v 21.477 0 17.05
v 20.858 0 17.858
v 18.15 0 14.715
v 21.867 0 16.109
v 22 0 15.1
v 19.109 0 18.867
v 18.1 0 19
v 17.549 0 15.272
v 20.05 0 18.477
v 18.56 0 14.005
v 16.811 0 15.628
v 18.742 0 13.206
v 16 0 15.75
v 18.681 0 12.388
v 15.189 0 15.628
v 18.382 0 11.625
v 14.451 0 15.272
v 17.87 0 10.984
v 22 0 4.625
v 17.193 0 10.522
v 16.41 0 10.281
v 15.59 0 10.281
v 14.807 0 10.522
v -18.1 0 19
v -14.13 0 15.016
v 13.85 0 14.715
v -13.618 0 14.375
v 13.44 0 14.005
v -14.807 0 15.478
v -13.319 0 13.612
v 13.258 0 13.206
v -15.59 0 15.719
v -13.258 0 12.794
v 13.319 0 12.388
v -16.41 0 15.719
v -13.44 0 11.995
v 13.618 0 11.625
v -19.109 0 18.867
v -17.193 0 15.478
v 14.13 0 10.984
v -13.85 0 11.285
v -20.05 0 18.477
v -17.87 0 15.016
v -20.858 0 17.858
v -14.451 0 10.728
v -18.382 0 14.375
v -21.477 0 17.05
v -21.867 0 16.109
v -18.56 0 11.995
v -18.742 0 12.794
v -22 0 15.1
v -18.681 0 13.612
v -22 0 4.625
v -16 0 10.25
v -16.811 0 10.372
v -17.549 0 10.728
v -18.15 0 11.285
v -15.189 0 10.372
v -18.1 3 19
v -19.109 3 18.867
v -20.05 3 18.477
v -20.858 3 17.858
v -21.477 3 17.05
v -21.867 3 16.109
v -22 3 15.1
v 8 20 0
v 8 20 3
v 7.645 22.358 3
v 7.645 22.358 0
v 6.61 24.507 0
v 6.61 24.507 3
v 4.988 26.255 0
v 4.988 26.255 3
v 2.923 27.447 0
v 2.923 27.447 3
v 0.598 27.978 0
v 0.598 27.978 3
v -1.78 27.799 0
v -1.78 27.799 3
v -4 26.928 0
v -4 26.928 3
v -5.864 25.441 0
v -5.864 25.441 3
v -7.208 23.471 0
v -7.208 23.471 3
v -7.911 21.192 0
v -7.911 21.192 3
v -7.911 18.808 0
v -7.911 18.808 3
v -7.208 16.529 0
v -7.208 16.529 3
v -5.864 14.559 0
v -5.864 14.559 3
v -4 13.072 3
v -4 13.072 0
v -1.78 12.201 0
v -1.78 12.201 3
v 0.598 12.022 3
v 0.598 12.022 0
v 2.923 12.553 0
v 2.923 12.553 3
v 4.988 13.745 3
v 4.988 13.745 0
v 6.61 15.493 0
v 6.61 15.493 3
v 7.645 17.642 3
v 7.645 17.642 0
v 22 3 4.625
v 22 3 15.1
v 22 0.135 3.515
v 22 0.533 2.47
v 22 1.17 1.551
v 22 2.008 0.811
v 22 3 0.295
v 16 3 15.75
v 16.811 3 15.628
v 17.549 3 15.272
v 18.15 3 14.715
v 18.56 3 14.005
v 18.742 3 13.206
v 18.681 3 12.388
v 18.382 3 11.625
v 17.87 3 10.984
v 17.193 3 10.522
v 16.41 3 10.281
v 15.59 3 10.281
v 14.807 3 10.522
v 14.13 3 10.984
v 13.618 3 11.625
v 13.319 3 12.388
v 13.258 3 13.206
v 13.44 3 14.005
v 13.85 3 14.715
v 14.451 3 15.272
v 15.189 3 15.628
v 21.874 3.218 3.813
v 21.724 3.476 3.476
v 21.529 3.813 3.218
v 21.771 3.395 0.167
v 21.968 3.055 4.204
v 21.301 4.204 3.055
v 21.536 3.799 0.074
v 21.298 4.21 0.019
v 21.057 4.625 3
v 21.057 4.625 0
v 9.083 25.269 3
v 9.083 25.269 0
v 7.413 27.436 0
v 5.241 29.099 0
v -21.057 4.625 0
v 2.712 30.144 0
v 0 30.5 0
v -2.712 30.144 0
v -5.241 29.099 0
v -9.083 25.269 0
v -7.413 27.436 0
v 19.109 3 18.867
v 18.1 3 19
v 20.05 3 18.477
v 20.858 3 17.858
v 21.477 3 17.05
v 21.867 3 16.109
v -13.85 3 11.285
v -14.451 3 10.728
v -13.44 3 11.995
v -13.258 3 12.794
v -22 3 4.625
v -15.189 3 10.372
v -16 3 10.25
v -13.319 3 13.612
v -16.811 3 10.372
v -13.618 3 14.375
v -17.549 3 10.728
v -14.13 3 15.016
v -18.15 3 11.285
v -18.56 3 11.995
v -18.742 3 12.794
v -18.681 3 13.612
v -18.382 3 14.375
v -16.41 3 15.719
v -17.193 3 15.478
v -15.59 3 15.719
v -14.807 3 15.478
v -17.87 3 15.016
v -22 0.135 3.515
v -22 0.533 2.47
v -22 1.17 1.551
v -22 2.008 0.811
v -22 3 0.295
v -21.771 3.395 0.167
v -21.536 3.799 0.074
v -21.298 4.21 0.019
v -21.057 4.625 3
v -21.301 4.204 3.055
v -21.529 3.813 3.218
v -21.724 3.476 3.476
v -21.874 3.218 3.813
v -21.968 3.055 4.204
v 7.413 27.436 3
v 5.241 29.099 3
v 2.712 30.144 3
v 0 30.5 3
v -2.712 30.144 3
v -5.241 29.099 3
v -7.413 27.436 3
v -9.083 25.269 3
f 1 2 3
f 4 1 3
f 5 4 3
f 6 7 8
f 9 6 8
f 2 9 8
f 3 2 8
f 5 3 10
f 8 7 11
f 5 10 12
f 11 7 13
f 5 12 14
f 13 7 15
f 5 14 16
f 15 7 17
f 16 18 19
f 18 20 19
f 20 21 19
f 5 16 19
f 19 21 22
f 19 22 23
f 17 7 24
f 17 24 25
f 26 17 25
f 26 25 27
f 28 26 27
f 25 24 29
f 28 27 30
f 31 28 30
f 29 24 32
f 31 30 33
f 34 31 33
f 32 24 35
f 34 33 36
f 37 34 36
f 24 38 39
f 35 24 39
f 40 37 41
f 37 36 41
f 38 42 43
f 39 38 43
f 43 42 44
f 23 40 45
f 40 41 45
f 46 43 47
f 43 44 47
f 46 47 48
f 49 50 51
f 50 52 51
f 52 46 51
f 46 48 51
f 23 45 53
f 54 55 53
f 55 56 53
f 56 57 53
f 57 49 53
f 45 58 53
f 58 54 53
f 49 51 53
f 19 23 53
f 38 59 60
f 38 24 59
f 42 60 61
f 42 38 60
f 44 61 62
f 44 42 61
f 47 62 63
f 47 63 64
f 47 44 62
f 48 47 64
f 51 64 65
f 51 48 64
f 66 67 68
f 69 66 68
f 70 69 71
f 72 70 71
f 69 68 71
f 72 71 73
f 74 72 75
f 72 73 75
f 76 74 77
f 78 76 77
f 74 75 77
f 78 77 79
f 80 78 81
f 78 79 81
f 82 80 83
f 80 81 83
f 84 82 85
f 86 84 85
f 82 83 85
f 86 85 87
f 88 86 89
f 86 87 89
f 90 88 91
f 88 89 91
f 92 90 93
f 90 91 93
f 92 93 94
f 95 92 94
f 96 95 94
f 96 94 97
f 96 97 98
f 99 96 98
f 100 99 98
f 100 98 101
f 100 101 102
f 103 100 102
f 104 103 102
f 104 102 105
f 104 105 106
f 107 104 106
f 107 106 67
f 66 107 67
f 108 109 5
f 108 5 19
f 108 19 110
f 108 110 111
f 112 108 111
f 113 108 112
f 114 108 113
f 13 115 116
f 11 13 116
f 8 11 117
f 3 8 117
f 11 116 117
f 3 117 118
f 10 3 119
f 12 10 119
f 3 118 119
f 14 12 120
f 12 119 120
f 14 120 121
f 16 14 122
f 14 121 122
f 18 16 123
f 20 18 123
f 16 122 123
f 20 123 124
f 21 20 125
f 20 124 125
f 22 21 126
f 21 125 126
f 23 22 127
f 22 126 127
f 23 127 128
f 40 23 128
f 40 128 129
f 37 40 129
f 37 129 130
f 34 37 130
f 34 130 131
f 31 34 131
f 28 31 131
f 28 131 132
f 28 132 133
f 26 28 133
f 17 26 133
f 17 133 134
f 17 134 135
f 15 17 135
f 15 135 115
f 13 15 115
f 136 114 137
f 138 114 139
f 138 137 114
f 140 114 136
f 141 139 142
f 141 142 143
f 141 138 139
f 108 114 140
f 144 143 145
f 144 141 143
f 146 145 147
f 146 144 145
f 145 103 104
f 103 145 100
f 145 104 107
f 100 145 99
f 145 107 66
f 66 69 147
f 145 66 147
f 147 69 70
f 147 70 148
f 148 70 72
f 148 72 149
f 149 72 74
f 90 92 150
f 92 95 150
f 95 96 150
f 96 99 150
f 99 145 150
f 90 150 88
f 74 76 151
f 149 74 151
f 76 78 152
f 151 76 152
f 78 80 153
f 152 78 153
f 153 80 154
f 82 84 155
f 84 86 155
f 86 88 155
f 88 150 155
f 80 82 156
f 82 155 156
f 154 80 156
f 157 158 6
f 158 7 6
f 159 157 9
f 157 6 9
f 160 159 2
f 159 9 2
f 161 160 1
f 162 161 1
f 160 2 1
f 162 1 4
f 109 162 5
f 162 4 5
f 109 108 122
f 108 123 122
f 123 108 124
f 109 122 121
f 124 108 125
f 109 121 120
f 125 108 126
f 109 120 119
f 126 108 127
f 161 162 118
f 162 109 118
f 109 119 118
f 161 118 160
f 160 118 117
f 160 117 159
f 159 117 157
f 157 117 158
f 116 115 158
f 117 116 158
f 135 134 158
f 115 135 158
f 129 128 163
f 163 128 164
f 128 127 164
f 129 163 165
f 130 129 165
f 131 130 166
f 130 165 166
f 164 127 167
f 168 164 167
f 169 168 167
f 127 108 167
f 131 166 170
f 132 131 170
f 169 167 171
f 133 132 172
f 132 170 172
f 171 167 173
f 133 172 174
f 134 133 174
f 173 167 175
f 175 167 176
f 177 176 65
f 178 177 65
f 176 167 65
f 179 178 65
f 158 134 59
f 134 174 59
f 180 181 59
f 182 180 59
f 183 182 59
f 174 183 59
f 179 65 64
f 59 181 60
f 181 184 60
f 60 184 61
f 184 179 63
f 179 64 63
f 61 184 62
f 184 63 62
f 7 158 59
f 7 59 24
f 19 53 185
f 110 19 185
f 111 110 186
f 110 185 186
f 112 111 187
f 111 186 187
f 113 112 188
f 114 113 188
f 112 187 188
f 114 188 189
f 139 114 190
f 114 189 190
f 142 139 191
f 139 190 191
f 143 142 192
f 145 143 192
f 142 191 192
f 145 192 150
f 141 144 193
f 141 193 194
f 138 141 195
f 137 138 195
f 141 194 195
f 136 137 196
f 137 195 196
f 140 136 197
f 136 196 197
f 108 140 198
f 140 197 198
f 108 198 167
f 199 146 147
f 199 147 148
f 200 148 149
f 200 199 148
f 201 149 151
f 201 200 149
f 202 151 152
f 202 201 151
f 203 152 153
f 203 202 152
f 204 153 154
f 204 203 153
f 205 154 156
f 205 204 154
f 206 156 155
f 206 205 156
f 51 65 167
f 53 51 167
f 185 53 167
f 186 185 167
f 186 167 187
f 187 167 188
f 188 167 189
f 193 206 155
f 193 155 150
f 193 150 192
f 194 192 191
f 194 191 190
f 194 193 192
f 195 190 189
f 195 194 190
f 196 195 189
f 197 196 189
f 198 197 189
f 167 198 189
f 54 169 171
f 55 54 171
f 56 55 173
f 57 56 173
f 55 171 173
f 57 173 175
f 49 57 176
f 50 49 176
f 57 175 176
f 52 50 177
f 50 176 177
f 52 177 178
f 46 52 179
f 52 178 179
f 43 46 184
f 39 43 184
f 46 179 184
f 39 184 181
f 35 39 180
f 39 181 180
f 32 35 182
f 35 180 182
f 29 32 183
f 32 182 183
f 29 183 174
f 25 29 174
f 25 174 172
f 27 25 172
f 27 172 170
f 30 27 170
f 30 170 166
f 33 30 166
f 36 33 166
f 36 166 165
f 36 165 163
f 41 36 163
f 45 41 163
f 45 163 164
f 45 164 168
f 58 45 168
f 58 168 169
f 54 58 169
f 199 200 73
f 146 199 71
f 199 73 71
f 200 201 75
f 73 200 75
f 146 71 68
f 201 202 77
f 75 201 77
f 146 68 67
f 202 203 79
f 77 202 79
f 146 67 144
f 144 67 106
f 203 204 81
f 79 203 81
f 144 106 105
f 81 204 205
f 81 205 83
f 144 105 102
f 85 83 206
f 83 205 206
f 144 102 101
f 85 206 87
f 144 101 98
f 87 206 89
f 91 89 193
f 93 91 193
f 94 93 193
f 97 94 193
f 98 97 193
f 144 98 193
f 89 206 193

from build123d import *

# Parameters (mm, degrees)
EXTRUDE_START                   = -22
EXTRUDE_1_DEPTH                 = 44
CUT_EXTRUDE_1_DEPTH             = 10
CUT_EXTRUDE_1_DIRECTION_2_REACH = 42.869
SKETCH_6_R                      = 8
CUT_EXTRUDE_2_DEPTH             = 41.868692174
SKETCH_7_R                      = 2.75
CUT_EXTRUDE_3_DEPTH             = 41.015621949
FILLET_1_R                      = 3.9


with BuildPart() as part:
    # 草图4 → 凸台-拉伸1 (new body)
    with BuildSketch(Plane(origin=(0, 0, 0), x_dir=(0, 0, -1), z_dir=(1, 0, 0)).offset(EXTRUDE_START)):
        with BuildLine():
            Line((-19, 0), (-4.625, 0))
            ThreePointArc((-4.625, 0), (-1.354631137, 1.354631137), (0, 4.625))
            Line((0, 4.625), (0, 30.5))
            Line((0, 30.5), (-3, 30.5))
            Line((-3, 30.5), (-3, 4.625))
            ThreePointArc((-3, 4.625), (-3.475951481, 3.475951481), (-4.625, 3))
            Line((-4.625, 3), (-19, 3))
            Line((-19, 3), (-19, 0))
        make_face()
    extrude(amount=EXTRUDE_1_DEPTH)

    # 草图5 → 切除-拉伸1 (cut)
    with BuildSketch(Plane.XY.offset(3)):
        with BuildLine():
            Line((-9.082524892, 25.268561625), (-22, 3))
            Line((-22, 3), (-22, 31.5))
            Line((-22, 31.5), (22, 31.5))
            Line((22, 31.5), (22, 3))
            Line((22, 3), (9.082524892, 25.268561625))
            ThreePointArc((9.082524892, 25.268561625), (0, 30.5), (-9.082524892, 25.268561625))
        make_face()
    extrude(amount=-CUT_EXTRUDE_1_DEPTH, mode=Mode.SUBTRACT)

    # 切除-拉伸1 direction 2: up to this face of the body (flat: up to its plane)
    cut_extrude_1_direction_2_end = Plane(part.part.faces().sort_by_distance((0, 1.5, 19))[0])
    # 草图5 → 切除-拉伸1 direction 2 (cut, up to the picked face)
    with BuildSketch(Plane.XY.offset(3), mode=Mode.PRIVATE) as cut_extrude_1_direction_2_sk1:
        with BuildLine():
            Line((-9.082524892, 25.268561625), (-22, 3))
            Line((-22, 3), (-22, 31.5))
            Line((-22, 31.5), (22, 31.5))
            Line((22, 31.5), (22, 3))
            Line((22, 3), (9.082524892, 25.268561625))
            ThreePointArc((9.082524892, 25.268561625), (0, 30.5), (-9.082524892, 25.268561625))
        make_face()
    cut_extrude_1_direction_2_tool1 = split(extrude(cut_extrude_1_direction_2_sk1.sketch, amount=CUT_EXTRUDE_1_DIRECTION_2_REACH, mode=Mode.PRIVATE), bisect_by=cut_extrude_1_direction_2_end, keep=Keep.BOTH, mode=Mode.PRIVATE)
    add(cut_extrude_1_direction_2_tool1.solids().sort_by(Axis((-15.994729, 14.397326, 3), (0, 0, 1)))[0], mode=Mode.SUBTRACT)

    # 草图6 → 切除-拉伸2 (cut, through all)
    with BuildSketch(Plane.XY.offset(3)):
        with Locations((0, 20)):
            Circle(SKETCH_6_R)
    extrude(amount=-CUT_EXTRUDE_2_DEPTH, mode=Mode.SUBTRACT)

    # 草图7 → 切除-拉伸3 (cut, through all)
    with BuildSketch(Plane(origin=(0, 3, 0), x_dir=(1, 0, 0), z_dir=(0, 1, 0))):
        with Locations(Location((16, -13, 0), (0, 0, 270))):
            Circle(SKETCH_7_R)
        with Locations(Location((-16, -13, 0), (0, 0, 90))):
            Circle(SKETCH_7_R)
    extrude(amount=-CUT_EXTRUDE_3_DEPTH, mode=Mode.SUBTRACT)

    # 圆角1
    fillet_1_edges = [part.edges().sort_by_distance(p)[0] for p in [
        (-22, 1.5, 19),
        (22, 1.5, 19),
    ]]
    fillet(fillet_1_edges, radius=FILLET_1_R)


solid = part.part
